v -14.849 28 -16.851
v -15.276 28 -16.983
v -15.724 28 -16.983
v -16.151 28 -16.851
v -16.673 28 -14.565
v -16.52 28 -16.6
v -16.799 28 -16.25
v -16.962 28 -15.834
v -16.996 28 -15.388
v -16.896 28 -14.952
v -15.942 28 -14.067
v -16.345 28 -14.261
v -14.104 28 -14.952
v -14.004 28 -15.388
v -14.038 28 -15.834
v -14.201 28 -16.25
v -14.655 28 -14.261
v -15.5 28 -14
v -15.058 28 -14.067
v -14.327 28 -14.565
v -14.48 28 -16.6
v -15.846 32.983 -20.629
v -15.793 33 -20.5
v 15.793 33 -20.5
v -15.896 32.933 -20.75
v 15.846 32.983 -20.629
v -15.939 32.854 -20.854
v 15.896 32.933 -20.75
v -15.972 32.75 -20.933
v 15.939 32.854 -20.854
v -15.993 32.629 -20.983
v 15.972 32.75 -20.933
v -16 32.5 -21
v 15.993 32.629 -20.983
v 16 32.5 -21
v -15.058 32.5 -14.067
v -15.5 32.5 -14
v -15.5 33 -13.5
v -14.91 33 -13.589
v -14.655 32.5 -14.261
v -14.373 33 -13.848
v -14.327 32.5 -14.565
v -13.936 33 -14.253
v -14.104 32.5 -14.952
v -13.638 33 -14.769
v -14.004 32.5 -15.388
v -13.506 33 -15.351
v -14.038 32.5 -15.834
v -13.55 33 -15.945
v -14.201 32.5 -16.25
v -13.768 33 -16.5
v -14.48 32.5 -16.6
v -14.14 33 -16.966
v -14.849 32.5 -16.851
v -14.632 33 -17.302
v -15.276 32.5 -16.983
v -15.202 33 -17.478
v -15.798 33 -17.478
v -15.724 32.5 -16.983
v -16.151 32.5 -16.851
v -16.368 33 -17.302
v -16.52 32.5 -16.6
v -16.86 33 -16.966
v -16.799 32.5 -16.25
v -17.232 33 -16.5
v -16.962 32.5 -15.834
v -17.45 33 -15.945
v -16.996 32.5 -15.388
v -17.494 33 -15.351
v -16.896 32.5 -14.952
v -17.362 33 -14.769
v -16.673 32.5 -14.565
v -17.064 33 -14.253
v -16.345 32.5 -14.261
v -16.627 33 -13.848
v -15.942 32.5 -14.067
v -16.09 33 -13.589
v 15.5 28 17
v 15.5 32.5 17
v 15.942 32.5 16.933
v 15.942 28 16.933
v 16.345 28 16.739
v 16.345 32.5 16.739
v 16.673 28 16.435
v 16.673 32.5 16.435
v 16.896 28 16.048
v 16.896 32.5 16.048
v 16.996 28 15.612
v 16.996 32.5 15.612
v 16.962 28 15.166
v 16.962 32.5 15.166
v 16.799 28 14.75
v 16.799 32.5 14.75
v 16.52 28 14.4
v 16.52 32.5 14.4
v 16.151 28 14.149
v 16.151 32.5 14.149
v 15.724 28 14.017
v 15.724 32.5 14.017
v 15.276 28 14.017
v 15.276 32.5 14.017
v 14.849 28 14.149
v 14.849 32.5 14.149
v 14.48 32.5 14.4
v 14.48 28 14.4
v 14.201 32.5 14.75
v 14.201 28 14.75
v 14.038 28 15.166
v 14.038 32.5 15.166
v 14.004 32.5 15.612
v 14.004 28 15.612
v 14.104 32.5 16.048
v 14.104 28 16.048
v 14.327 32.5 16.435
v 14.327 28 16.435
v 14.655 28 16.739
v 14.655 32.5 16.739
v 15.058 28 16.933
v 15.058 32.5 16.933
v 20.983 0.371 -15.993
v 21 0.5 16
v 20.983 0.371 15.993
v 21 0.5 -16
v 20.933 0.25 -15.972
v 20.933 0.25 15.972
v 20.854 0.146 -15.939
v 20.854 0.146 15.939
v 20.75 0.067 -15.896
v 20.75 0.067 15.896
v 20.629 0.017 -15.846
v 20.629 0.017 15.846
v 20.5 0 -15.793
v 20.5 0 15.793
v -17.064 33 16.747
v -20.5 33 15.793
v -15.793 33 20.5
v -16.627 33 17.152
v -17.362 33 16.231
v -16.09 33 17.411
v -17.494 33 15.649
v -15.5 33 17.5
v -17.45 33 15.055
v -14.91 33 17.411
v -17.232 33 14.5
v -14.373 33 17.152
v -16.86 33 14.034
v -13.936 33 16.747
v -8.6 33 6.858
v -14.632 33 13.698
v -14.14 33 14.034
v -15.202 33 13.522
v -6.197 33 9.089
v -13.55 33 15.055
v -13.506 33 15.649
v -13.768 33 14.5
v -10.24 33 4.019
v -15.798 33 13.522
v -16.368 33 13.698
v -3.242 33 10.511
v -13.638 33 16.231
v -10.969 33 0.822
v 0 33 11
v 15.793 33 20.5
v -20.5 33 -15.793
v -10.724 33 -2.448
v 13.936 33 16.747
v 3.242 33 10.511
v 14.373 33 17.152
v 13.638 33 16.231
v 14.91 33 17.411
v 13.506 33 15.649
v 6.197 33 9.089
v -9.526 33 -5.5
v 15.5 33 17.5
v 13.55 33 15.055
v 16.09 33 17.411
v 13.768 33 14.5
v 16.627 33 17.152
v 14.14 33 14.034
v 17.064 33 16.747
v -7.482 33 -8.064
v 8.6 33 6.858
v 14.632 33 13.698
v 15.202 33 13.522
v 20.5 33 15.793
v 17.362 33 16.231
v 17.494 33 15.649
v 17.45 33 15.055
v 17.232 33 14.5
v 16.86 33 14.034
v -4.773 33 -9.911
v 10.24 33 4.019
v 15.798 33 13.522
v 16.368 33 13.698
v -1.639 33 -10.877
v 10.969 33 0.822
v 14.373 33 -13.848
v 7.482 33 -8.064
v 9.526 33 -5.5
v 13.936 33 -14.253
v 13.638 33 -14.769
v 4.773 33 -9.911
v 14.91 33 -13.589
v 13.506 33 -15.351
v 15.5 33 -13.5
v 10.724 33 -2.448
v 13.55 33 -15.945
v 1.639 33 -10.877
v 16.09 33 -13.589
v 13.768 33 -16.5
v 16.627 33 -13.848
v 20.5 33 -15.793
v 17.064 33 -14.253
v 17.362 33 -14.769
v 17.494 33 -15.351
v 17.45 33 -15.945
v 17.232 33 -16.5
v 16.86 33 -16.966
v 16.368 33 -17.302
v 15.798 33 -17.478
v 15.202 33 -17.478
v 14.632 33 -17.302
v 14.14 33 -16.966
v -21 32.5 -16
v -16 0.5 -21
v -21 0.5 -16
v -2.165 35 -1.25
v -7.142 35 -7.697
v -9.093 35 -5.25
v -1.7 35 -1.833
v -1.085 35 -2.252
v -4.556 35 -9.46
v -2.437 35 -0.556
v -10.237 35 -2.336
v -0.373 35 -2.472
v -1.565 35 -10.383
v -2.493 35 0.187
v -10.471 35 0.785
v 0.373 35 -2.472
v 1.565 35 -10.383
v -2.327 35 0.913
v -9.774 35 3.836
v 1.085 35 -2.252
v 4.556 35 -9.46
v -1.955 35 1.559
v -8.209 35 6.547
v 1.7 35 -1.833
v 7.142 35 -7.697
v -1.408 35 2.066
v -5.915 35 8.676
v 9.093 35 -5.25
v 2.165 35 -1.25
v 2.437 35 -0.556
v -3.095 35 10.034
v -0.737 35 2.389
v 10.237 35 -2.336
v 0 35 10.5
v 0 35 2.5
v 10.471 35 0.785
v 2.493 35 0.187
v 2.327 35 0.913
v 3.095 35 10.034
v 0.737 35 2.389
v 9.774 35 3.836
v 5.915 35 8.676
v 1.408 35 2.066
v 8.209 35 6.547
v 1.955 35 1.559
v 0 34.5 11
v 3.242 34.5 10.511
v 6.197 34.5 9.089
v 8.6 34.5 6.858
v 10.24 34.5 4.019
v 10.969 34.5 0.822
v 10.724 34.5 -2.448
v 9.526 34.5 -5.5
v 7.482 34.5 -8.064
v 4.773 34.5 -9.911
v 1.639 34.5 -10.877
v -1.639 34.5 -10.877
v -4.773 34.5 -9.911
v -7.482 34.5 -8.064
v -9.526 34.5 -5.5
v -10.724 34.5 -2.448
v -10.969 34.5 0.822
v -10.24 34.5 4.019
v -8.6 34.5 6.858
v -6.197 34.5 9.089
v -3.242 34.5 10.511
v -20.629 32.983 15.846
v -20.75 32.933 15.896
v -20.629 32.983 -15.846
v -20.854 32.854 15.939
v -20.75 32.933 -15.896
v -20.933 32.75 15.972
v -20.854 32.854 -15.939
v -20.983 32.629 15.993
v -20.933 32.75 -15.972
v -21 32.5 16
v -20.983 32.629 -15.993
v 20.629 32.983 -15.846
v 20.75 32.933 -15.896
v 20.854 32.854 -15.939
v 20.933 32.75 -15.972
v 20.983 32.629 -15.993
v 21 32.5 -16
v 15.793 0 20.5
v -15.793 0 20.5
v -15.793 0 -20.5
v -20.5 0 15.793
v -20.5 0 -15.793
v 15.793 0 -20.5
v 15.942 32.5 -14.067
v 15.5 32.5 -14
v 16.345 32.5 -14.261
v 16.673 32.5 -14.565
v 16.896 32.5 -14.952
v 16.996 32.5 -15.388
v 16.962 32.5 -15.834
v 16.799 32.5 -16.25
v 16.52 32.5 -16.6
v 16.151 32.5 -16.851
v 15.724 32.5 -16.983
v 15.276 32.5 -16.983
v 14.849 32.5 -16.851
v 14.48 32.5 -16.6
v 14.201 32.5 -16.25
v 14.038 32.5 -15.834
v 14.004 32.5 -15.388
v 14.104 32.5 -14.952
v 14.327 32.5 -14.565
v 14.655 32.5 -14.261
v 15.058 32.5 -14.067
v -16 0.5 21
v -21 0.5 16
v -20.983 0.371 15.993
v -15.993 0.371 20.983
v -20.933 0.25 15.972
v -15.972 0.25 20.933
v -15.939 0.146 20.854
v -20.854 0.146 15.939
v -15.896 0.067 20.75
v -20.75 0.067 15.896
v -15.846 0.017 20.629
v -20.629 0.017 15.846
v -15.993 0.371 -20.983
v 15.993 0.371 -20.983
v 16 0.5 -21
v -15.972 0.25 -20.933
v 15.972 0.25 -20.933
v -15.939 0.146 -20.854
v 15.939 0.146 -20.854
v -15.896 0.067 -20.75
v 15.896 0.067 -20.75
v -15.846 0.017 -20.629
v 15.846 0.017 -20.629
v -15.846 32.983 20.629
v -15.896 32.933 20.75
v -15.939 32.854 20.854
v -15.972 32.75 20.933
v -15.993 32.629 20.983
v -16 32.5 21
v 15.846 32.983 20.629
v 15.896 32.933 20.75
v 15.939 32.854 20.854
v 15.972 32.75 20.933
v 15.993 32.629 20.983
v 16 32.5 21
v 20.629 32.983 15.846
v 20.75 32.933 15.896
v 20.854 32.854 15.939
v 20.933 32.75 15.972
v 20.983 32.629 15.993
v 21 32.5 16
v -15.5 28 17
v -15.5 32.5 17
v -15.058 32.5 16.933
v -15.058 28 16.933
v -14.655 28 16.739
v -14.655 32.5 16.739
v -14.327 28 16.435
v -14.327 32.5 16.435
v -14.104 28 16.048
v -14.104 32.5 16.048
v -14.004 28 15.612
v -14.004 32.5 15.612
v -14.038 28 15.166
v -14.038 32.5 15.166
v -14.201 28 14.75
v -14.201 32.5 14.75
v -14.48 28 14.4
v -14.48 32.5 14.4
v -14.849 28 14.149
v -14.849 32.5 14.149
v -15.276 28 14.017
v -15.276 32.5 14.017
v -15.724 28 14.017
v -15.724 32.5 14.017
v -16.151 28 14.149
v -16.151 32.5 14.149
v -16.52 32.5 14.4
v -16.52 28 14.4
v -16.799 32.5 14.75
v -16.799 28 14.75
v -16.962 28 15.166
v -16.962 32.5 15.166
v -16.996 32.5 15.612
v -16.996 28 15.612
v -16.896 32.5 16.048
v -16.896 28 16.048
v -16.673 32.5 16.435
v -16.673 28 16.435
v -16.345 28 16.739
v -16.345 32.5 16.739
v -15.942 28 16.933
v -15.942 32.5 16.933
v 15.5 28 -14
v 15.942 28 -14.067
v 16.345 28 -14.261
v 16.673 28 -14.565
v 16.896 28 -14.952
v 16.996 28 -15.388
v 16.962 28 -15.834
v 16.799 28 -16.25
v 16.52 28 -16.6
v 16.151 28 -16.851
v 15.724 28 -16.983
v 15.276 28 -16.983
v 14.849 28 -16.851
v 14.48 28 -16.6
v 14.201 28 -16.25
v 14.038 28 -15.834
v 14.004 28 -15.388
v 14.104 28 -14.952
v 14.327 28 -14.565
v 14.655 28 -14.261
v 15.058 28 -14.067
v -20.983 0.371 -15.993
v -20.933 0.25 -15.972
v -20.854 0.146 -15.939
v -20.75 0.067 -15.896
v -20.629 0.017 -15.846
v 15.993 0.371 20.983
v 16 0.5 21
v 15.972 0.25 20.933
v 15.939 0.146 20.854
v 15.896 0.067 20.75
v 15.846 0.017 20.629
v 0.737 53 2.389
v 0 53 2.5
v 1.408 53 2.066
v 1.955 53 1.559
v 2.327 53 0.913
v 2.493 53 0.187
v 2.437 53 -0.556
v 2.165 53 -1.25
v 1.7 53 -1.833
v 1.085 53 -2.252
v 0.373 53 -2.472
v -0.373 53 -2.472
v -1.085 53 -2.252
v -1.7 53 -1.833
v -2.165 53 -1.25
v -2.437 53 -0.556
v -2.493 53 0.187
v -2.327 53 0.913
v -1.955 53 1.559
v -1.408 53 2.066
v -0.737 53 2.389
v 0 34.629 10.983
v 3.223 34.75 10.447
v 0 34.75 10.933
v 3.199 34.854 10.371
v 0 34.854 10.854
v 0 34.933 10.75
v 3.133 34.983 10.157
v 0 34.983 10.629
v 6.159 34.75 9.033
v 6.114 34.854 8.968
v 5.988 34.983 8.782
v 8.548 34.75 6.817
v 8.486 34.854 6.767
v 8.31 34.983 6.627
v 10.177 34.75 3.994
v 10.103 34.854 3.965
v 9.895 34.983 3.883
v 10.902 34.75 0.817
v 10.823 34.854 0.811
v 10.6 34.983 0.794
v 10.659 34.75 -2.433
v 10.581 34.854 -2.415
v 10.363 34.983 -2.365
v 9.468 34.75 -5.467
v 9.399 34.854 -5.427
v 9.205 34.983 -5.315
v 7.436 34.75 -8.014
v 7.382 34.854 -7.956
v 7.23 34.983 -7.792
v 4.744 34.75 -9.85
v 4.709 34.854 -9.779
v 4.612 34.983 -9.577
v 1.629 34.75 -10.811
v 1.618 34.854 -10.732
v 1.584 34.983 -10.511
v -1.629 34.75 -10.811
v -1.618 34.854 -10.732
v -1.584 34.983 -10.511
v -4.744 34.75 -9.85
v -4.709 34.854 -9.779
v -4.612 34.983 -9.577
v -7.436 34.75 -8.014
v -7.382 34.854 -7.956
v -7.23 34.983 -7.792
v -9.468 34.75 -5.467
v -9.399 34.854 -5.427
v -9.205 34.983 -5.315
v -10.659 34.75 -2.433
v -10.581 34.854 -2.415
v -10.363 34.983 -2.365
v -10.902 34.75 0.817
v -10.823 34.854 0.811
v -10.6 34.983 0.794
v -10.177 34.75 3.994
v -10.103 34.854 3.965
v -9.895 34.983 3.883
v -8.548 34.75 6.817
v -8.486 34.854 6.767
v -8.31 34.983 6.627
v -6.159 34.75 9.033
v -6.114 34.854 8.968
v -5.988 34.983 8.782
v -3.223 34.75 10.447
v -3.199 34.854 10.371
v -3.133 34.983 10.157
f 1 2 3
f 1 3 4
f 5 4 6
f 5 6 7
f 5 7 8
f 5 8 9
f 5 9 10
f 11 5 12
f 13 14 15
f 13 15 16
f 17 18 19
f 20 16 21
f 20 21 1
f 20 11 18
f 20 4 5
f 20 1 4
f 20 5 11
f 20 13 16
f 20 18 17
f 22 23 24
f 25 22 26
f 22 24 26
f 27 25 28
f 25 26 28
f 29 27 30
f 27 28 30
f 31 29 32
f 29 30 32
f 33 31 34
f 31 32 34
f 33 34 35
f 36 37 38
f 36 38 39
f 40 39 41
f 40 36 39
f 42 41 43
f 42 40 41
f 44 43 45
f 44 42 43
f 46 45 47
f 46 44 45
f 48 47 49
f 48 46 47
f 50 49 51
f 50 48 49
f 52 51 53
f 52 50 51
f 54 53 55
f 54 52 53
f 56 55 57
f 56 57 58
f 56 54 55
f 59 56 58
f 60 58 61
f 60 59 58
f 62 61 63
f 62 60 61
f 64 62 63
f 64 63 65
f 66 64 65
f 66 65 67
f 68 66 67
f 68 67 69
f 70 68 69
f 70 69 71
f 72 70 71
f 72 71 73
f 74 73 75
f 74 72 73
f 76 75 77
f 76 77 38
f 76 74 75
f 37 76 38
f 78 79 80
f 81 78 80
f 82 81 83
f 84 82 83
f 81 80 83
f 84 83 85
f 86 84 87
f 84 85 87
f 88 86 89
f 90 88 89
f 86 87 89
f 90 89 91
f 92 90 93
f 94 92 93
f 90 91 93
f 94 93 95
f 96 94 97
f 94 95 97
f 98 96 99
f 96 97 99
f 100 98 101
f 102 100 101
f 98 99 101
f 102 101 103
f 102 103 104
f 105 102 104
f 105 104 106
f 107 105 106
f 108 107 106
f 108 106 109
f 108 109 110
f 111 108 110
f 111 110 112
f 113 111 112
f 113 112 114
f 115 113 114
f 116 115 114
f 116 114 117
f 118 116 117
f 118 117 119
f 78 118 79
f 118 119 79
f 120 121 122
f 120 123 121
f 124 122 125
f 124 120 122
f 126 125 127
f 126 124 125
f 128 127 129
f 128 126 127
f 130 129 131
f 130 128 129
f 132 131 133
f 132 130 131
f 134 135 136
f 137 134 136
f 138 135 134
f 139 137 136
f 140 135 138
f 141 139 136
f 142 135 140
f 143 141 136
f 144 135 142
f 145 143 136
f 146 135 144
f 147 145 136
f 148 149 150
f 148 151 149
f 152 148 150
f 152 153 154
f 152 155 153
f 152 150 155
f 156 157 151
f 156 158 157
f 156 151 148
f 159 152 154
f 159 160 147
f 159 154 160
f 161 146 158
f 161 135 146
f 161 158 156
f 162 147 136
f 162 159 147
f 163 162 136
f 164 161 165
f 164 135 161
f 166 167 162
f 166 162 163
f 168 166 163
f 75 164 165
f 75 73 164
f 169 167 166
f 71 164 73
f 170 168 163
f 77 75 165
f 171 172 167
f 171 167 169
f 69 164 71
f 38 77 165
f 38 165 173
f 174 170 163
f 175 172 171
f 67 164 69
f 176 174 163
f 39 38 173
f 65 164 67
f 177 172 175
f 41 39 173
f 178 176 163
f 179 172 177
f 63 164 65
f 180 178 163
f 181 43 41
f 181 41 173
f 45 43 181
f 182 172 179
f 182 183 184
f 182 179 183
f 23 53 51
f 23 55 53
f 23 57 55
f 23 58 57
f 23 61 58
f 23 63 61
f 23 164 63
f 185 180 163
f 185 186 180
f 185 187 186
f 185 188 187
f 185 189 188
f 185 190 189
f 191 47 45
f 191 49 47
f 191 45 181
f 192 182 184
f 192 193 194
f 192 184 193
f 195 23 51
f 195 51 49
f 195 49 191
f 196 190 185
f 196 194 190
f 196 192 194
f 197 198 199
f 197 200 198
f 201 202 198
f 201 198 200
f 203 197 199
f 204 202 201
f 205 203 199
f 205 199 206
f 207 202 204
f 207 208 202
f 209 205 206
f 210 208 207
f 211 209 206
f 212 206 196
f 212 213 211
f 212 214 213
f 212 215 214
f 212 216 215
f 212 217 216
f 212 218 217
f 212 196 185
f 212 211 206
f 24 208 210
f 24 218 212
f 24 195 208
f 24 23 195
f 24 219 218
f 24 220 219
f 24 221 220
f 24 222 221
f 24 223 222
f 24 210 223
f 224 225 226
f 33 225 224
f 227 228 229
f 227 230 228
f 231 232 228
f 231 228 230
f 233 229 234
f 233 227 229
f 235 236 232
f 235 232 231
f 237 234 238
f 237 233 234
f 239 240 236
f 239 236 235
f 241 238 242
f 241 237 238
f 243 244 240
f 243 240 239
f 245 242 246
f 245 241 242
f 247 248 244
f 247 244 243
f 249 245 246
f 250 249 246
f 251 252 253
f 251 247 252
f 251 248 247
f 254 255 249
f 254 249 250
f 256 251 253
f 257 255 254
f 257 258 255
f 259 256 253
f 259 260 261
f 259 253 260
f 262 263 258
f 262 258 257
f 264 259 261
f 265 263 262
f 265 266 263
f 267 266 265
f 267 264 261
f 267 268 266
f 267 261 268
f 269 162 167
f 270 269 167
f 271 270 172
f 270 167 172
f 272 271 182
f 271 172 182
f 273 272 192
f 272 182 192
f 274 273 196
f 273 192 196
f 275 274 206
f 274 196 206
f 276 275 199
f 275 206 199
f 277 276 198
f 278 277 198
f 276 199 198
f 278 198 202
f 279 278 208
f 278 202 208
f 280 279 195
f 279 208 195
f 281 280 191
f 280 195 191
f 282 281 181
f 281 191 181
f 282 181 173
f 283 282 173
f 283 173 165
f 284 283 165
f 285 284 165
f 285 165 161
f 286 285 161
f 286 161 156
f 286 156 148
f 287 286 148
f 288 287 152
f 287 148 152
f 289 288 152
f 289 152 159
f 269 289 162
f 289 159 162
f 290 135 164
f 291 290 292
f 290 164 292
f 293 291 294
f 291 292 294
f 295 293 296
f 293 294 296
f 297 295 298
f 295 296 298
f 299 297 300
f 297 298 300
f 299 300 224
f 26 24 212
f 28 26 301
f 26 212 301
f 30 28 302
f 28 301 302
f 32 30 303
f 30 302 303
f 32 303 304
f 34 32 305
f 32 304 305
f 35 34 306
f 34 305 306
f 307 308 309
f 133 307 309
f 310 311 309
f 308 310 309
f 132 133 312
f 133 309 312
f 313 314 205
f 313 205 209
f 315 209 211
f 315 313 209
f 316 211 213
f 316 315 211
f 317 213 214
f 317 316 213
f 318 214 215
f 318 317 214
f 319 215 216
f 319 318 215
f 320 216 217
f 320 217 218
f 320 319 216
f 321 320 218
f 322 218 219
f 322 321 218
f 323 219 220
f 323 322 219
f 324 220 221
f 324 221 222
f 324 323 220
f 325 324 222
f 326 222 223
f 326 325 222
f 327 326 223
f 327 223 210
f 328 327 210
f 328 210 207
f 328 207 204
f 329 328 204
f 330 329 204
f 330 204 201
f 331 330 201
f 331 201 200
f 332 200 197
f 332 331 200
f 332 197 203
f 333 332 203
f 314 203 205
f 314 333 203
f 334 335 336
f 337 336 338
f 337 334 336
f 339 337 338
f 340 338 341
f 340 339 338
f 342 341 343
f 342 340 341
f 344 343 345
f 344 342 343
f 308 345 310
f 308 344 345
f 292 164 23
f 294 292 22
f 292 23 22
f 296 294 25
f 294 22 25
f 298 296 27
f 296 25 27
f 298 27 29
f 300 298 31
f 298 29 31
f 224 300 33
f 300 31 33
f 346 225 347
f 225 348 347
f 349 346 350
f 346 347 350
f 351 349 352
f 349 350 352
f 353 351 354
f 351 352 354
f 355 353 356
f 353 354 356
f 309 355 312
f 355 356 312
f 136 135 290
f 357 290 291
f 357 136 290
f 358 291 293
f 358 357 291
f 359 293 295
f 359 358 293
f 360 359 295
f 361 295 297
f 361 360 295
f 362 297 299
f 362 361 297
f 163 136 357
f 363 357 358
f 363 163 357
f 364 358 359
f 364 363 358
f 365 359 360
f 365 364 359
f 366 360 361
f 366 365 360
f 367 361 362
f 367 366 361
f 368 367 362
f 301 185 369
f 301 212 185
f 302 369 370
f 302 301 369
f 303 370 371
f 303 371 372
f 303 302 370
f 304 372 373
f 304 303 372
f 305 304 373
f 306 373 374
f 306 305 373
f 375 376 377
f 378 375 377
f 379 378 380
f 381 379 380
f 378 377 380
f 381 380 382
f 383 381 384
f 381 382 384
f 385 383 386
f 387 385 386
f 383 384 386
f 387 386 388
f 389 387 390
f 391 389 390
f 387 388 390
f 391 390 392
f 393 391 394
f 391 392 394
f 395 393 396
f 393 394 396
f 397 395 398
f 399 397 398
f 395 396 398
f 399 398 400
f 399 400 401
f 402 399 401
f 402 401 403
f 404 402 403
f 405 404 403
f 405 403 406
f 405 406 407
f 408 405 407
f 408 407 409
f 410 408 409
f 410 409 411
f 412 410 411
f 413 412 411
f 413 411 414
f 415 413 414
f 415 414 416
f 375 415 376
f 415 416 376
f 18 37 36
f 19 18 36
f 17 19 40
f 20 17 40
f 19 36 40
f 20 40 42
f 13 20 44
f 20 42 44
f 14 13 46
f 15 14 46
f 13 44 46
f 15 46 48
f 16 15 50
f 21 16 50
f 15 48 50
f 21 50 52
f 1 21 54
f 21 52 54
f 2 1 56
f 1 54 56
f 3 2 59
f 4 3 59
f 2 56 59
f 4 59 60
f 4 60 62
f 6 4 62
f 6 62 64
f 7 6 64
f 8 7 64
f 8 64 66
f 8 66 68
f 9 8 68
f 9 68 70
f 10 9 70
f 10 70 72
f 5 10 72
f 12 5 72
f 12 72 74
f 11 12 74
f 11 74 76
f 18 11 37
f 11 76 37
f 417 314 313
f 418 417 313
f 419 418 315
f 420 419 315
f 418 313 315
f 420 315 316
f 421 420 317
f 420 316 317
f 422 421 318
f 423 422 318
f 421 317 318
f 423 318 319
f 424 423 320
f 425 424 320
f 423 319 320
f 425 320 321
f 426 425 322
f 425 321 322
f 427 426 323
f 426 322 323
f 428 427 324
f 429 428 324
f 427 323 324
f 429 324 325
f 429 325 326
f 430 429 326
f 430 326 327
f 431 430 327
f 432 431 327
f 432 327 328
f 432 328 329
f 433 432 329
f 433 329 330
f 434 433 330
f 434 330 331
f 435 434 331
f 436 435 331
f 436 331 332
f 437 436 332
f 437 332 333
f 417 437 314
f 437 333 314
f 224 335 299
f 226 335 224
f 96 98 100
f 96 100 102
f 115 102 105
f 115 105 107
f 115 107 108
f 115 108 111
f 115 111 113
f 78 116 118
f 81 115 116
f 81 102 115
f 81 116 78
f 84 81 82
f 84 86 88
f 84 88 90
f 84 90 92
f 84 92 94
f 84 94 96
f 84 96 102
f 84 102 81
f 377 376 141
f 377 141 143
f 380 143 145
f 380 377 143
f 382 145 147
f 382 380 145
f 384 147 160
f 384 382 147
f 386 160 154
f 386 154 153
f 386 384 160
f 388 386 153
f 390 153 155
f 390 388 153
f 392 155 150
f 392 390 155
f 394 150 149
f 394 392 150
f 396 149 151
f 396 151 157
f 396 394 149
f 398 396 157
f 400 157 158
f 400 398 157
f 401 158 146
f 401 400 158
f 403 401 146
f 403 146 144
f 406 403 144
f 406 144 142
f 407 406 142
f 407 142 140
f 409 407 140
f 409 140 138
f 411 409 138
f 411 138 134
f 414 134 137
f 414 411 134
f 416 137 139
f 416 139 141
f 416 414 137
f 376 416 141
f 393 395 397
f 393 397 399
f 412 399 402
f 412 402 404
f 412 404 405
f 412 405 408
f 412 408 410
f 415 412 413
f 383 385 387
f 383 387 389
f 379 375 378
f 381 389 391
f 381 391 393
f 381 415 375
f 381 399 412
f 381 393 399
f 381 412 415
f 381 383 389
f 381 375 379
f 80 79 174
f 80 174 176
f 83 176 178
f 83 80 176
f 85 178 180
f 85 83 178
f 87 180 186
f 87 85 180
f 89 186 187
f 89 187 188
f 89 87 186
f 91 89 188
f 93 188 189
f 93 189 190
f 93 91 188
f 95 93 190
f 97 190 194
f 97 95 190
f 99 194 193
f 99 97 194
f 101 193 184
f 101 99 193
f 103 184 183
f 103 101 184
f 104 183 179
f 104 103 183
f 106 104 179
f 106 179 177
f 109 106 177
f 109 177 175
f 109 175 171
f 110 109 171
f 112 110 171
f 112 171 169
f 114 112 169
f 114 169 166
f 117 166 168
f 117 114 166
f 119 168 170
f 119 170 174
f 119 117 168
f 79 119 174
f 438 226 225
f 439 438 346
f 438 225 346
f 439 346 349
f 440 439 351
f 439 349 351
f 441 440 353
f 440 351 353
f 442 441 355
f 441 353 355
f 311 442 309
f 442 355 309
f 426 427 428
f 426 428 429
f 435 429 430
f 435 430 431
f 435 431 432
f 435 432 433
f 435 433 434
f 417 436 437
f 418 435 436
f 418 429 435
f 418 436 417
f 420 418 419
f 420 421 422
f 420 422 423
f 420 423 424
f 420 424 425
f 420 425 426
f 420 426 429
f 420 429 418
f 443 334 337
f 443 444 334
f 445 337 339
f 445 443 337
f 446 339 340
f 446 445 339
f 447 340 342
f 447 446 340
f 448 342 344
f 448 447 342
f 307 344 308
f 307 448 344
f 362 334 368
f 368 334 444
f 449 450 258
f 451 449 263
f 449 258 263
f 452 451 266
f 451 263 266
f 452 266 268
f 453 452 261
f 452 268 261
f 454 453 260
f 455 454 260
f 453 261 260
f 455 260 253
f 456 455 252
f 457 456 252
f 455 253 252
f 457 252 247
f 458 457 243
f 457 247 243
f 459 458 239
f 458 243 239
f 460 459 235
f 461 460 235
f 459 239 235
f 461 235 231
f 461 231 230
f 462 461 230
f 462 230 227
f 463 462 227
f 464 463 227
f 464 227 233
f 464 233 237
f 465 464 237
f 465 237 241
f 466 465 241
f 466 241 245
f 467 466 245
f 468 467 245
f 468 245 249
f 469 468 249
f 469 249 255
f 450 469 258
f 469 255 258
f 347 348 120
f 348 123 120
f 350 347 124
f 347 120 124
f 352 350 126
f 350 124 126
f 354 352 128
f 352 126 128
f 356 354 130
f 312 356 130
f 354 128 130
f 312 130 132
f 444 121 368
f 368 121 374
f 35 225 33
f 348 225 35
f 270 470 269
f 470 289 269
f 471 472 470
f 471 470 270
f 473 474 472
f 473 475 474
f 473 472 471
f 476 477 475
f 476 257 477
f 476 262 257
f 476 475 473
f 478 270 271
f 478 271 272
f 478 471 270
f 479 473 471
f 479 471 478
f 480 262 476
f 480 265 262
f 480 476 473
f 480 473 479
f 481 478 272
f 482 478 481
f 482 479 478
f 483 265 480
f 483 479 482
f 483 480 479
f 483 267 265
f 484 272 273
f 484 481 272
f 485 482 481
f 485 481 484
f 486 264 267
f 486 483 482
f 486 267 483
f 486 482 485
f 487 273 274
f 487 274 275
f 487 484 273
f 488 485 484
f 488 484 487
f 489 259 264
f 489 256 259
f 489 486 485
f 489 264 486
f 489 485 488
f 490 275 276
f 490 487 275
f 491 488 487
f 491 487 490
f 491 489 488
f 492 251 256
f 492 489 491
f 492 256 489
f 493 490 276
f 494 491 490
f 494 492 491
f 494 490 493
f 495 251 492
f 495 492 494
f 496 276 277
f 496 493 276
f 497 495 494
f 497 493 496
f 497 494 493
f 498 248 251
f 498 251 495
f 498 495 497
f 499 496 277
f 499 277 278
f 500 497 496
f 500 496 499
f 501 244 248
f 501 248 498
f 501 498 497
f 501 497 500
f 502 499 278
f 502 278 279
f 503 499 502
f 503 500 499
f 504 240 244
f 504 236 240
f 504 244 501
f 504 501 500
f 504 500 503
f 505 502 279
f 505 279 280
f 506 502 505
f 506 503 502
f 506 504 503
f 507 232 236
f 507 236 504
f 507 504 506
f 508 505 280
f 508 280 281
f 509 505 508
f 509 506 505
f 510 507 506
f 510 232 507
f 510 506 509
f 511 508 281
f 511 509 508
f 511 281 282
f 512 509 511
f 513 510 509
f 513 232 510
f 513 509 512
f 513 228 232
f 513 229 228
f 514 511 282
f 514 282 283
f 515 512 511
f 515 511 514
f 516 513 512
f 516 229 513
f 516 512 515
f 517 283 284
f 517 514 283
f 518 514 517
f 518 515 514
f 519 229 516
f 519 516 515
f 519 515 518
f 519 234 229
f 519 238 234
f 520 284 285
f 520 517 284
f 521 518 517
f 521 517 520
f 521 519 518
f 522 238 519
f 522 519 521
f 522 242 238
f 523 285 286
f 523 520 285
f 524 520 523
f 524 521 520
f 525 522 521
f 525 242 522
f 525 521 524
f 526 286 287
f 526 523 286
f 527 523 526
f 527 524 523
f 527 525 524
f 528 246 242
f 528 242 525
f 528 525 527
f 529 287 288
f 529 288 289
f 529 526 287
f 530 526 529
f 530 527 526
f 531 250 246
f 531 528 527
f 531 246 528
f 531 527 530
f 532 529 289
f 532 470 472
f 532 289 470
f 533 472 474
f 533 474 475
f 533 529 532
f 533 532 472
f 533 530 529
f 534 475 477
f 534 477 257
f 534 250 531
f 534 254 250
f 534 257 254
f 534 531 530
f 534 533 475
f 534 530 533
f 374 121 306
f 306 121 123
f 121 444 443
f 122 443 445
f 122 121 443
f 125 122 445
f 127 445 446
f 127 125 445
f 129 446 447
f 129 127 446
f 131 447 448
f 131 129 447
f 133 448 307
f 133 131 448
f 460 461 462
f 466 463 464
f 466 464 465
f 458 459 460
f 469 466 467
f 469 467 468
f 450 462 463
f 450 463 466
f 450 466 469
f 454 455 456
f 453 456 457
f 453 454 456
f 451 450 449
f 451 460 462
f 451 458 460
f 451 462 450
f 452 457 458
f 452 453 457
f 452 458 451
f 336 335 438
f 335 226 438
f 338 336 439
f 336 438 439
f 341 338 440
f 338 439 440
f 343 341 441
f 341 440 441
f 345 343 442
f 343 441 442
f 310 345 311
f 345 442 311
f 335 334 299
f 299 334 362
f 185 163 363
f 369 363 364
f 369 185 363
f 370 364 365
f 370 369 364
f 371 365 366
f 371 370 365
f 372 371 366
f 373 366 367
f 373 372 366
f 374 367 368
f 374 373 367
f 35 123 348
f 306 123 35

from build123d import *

# Parameters (mm, degrees)
SKETCH1_W           = 42
SKETCH1_H           = 42
BOSS_EXTRUDE1_DEPTH = 33
SKETCH2_R           = 11
BOSS_EXTRUDE2_DEPTH = 2
SKETCH3_R           = 2.5
BOSS_EXTRUDE3_DEPTH = 18
SKETCH4_R           = 1.5
CUT_EXTRUDE1_DEPTH  = 5
CHAMFER1_SIZE       = 5
CHAMFER2_SIZE       = 0.5
FILLET1_R           = 0.5
FILLET2_R           = 0.5


with BuildPart() as part:
    # Sketch1 → Boss-Extrude1 (new body)
    with BuildSketch(Plane(origin=(0, 0, 0), x_dir=(1, 0, 0), z_dir=(0, 1, 0))):
        Rectangle(SKETCH1_W, SKETCH1_H)
    extrude(amount=BOSS_EXTRUDE1_DEPTH)

    # Sketch2 → Boss-Extrude2 (add)
    with BuildSketch(Plane(origin=(0, 33, 0), x_dir=(1, 0, 0), z_dir=(0, 1, 0))):
        with Locations(Location((0, 0, 0), (0, 0, 270))):
            Circle(SKETCH2_R)
    extrude(amount=BOSS_EXTRUDE2_DEPTH)

    # Sketch3 → Boss-Extrude3 (add)
    with BuildSketch(Plane(origin=(0, 35, 0), x_dir=(1, 0, 0), z_dir=(0, 1, 0))):
        with Locations(Location((0, 0, 0), (0, 0, 270))):
            Circle(SKETCH3_R)
    extrude(amount=BOSS_EXTRUDE3_DEPTH)

    # Sketch4 → Cut-Extrude1 (cut)
    with BuildSketch(Plane(origin=(0, 33, 0), x_dir=(1, 0, 0), z_dir=(0, 1, 0))):
        with Locations(Location((-15.5, 15.5, 0), (0, 0, 270))):
            Circle(SKETCH4_R)
        with Locations(Location((15.5, 15.5, 0), (0, 0, 270))):
            Circle(SKETCH4_R)
        with Locations(Location((15.5, -15.5, 0), (0, 0, 270))):
            Circle(SKETCH4_R)
        with Locations(Location((-15.5, -15.5, 0), (0, 0, 270))):
            Circle(SKETCH4_R)
    extrude(amount=-CUT_EXTRUDE1_DEPTH, mode=Mode.SUBTRACT)

    # Chamfer1
    chamfer1_edges = [part.edges().sort_by_distance(p)[0] for p in [
        (-21, 16.5, -21),
        (21, 16.5, -21),
        (21, 16.5, 21),
        (-21, 16.5, 21),
    ]]
    chamfer(chamfer1_edges, length=CHAMFER1_SIZE)

    # Chamfer2
    chamfer2_edges = [part.edges().sort_by_distance(p)[0] for p in [
        (-15.5, 33, -17),
        (15.5, 33, -17),
        (15.5, 33, 14),
        (-15.5, 33, 14),
    ]]
    chamfer(chamfer2_edges, length=CHAMFER2_SIZE)

    # Fillet1
    fillet1_edges = [part.edges().sort_by_distance(p)[0] for p in [
        (0, 0, 21),
        (0, 33, 21),
        (-21, 0, 0),
        (0, 0, -21),
        (21, 0, 0),
        (18.5, 0, 18.5),
        (18.5, 0, -18.5),
        (-18.5, 0, -18.5),
        (-18.5, 0, 18.5),
        (-21, 33, 0),
        (21, 33, 0),
        (0, 33, -21),
        (18.5, 33, 18.5),
        (18.5, 33, -18.5),
        (-18.5, 33, -18.5),
        (-18.5, 33, 18.5),
    ]]
    fillet(fillet1_edges, radius=FILLET1_R)

    # Fillet2
    fillet2_edges = [part.edges().sort_by_distance(p)[0] for p in [
        (0, 35, -11),
    ]]
    fillet(fillet2_edges, radius=FILLET2_R)


solid = part.part
